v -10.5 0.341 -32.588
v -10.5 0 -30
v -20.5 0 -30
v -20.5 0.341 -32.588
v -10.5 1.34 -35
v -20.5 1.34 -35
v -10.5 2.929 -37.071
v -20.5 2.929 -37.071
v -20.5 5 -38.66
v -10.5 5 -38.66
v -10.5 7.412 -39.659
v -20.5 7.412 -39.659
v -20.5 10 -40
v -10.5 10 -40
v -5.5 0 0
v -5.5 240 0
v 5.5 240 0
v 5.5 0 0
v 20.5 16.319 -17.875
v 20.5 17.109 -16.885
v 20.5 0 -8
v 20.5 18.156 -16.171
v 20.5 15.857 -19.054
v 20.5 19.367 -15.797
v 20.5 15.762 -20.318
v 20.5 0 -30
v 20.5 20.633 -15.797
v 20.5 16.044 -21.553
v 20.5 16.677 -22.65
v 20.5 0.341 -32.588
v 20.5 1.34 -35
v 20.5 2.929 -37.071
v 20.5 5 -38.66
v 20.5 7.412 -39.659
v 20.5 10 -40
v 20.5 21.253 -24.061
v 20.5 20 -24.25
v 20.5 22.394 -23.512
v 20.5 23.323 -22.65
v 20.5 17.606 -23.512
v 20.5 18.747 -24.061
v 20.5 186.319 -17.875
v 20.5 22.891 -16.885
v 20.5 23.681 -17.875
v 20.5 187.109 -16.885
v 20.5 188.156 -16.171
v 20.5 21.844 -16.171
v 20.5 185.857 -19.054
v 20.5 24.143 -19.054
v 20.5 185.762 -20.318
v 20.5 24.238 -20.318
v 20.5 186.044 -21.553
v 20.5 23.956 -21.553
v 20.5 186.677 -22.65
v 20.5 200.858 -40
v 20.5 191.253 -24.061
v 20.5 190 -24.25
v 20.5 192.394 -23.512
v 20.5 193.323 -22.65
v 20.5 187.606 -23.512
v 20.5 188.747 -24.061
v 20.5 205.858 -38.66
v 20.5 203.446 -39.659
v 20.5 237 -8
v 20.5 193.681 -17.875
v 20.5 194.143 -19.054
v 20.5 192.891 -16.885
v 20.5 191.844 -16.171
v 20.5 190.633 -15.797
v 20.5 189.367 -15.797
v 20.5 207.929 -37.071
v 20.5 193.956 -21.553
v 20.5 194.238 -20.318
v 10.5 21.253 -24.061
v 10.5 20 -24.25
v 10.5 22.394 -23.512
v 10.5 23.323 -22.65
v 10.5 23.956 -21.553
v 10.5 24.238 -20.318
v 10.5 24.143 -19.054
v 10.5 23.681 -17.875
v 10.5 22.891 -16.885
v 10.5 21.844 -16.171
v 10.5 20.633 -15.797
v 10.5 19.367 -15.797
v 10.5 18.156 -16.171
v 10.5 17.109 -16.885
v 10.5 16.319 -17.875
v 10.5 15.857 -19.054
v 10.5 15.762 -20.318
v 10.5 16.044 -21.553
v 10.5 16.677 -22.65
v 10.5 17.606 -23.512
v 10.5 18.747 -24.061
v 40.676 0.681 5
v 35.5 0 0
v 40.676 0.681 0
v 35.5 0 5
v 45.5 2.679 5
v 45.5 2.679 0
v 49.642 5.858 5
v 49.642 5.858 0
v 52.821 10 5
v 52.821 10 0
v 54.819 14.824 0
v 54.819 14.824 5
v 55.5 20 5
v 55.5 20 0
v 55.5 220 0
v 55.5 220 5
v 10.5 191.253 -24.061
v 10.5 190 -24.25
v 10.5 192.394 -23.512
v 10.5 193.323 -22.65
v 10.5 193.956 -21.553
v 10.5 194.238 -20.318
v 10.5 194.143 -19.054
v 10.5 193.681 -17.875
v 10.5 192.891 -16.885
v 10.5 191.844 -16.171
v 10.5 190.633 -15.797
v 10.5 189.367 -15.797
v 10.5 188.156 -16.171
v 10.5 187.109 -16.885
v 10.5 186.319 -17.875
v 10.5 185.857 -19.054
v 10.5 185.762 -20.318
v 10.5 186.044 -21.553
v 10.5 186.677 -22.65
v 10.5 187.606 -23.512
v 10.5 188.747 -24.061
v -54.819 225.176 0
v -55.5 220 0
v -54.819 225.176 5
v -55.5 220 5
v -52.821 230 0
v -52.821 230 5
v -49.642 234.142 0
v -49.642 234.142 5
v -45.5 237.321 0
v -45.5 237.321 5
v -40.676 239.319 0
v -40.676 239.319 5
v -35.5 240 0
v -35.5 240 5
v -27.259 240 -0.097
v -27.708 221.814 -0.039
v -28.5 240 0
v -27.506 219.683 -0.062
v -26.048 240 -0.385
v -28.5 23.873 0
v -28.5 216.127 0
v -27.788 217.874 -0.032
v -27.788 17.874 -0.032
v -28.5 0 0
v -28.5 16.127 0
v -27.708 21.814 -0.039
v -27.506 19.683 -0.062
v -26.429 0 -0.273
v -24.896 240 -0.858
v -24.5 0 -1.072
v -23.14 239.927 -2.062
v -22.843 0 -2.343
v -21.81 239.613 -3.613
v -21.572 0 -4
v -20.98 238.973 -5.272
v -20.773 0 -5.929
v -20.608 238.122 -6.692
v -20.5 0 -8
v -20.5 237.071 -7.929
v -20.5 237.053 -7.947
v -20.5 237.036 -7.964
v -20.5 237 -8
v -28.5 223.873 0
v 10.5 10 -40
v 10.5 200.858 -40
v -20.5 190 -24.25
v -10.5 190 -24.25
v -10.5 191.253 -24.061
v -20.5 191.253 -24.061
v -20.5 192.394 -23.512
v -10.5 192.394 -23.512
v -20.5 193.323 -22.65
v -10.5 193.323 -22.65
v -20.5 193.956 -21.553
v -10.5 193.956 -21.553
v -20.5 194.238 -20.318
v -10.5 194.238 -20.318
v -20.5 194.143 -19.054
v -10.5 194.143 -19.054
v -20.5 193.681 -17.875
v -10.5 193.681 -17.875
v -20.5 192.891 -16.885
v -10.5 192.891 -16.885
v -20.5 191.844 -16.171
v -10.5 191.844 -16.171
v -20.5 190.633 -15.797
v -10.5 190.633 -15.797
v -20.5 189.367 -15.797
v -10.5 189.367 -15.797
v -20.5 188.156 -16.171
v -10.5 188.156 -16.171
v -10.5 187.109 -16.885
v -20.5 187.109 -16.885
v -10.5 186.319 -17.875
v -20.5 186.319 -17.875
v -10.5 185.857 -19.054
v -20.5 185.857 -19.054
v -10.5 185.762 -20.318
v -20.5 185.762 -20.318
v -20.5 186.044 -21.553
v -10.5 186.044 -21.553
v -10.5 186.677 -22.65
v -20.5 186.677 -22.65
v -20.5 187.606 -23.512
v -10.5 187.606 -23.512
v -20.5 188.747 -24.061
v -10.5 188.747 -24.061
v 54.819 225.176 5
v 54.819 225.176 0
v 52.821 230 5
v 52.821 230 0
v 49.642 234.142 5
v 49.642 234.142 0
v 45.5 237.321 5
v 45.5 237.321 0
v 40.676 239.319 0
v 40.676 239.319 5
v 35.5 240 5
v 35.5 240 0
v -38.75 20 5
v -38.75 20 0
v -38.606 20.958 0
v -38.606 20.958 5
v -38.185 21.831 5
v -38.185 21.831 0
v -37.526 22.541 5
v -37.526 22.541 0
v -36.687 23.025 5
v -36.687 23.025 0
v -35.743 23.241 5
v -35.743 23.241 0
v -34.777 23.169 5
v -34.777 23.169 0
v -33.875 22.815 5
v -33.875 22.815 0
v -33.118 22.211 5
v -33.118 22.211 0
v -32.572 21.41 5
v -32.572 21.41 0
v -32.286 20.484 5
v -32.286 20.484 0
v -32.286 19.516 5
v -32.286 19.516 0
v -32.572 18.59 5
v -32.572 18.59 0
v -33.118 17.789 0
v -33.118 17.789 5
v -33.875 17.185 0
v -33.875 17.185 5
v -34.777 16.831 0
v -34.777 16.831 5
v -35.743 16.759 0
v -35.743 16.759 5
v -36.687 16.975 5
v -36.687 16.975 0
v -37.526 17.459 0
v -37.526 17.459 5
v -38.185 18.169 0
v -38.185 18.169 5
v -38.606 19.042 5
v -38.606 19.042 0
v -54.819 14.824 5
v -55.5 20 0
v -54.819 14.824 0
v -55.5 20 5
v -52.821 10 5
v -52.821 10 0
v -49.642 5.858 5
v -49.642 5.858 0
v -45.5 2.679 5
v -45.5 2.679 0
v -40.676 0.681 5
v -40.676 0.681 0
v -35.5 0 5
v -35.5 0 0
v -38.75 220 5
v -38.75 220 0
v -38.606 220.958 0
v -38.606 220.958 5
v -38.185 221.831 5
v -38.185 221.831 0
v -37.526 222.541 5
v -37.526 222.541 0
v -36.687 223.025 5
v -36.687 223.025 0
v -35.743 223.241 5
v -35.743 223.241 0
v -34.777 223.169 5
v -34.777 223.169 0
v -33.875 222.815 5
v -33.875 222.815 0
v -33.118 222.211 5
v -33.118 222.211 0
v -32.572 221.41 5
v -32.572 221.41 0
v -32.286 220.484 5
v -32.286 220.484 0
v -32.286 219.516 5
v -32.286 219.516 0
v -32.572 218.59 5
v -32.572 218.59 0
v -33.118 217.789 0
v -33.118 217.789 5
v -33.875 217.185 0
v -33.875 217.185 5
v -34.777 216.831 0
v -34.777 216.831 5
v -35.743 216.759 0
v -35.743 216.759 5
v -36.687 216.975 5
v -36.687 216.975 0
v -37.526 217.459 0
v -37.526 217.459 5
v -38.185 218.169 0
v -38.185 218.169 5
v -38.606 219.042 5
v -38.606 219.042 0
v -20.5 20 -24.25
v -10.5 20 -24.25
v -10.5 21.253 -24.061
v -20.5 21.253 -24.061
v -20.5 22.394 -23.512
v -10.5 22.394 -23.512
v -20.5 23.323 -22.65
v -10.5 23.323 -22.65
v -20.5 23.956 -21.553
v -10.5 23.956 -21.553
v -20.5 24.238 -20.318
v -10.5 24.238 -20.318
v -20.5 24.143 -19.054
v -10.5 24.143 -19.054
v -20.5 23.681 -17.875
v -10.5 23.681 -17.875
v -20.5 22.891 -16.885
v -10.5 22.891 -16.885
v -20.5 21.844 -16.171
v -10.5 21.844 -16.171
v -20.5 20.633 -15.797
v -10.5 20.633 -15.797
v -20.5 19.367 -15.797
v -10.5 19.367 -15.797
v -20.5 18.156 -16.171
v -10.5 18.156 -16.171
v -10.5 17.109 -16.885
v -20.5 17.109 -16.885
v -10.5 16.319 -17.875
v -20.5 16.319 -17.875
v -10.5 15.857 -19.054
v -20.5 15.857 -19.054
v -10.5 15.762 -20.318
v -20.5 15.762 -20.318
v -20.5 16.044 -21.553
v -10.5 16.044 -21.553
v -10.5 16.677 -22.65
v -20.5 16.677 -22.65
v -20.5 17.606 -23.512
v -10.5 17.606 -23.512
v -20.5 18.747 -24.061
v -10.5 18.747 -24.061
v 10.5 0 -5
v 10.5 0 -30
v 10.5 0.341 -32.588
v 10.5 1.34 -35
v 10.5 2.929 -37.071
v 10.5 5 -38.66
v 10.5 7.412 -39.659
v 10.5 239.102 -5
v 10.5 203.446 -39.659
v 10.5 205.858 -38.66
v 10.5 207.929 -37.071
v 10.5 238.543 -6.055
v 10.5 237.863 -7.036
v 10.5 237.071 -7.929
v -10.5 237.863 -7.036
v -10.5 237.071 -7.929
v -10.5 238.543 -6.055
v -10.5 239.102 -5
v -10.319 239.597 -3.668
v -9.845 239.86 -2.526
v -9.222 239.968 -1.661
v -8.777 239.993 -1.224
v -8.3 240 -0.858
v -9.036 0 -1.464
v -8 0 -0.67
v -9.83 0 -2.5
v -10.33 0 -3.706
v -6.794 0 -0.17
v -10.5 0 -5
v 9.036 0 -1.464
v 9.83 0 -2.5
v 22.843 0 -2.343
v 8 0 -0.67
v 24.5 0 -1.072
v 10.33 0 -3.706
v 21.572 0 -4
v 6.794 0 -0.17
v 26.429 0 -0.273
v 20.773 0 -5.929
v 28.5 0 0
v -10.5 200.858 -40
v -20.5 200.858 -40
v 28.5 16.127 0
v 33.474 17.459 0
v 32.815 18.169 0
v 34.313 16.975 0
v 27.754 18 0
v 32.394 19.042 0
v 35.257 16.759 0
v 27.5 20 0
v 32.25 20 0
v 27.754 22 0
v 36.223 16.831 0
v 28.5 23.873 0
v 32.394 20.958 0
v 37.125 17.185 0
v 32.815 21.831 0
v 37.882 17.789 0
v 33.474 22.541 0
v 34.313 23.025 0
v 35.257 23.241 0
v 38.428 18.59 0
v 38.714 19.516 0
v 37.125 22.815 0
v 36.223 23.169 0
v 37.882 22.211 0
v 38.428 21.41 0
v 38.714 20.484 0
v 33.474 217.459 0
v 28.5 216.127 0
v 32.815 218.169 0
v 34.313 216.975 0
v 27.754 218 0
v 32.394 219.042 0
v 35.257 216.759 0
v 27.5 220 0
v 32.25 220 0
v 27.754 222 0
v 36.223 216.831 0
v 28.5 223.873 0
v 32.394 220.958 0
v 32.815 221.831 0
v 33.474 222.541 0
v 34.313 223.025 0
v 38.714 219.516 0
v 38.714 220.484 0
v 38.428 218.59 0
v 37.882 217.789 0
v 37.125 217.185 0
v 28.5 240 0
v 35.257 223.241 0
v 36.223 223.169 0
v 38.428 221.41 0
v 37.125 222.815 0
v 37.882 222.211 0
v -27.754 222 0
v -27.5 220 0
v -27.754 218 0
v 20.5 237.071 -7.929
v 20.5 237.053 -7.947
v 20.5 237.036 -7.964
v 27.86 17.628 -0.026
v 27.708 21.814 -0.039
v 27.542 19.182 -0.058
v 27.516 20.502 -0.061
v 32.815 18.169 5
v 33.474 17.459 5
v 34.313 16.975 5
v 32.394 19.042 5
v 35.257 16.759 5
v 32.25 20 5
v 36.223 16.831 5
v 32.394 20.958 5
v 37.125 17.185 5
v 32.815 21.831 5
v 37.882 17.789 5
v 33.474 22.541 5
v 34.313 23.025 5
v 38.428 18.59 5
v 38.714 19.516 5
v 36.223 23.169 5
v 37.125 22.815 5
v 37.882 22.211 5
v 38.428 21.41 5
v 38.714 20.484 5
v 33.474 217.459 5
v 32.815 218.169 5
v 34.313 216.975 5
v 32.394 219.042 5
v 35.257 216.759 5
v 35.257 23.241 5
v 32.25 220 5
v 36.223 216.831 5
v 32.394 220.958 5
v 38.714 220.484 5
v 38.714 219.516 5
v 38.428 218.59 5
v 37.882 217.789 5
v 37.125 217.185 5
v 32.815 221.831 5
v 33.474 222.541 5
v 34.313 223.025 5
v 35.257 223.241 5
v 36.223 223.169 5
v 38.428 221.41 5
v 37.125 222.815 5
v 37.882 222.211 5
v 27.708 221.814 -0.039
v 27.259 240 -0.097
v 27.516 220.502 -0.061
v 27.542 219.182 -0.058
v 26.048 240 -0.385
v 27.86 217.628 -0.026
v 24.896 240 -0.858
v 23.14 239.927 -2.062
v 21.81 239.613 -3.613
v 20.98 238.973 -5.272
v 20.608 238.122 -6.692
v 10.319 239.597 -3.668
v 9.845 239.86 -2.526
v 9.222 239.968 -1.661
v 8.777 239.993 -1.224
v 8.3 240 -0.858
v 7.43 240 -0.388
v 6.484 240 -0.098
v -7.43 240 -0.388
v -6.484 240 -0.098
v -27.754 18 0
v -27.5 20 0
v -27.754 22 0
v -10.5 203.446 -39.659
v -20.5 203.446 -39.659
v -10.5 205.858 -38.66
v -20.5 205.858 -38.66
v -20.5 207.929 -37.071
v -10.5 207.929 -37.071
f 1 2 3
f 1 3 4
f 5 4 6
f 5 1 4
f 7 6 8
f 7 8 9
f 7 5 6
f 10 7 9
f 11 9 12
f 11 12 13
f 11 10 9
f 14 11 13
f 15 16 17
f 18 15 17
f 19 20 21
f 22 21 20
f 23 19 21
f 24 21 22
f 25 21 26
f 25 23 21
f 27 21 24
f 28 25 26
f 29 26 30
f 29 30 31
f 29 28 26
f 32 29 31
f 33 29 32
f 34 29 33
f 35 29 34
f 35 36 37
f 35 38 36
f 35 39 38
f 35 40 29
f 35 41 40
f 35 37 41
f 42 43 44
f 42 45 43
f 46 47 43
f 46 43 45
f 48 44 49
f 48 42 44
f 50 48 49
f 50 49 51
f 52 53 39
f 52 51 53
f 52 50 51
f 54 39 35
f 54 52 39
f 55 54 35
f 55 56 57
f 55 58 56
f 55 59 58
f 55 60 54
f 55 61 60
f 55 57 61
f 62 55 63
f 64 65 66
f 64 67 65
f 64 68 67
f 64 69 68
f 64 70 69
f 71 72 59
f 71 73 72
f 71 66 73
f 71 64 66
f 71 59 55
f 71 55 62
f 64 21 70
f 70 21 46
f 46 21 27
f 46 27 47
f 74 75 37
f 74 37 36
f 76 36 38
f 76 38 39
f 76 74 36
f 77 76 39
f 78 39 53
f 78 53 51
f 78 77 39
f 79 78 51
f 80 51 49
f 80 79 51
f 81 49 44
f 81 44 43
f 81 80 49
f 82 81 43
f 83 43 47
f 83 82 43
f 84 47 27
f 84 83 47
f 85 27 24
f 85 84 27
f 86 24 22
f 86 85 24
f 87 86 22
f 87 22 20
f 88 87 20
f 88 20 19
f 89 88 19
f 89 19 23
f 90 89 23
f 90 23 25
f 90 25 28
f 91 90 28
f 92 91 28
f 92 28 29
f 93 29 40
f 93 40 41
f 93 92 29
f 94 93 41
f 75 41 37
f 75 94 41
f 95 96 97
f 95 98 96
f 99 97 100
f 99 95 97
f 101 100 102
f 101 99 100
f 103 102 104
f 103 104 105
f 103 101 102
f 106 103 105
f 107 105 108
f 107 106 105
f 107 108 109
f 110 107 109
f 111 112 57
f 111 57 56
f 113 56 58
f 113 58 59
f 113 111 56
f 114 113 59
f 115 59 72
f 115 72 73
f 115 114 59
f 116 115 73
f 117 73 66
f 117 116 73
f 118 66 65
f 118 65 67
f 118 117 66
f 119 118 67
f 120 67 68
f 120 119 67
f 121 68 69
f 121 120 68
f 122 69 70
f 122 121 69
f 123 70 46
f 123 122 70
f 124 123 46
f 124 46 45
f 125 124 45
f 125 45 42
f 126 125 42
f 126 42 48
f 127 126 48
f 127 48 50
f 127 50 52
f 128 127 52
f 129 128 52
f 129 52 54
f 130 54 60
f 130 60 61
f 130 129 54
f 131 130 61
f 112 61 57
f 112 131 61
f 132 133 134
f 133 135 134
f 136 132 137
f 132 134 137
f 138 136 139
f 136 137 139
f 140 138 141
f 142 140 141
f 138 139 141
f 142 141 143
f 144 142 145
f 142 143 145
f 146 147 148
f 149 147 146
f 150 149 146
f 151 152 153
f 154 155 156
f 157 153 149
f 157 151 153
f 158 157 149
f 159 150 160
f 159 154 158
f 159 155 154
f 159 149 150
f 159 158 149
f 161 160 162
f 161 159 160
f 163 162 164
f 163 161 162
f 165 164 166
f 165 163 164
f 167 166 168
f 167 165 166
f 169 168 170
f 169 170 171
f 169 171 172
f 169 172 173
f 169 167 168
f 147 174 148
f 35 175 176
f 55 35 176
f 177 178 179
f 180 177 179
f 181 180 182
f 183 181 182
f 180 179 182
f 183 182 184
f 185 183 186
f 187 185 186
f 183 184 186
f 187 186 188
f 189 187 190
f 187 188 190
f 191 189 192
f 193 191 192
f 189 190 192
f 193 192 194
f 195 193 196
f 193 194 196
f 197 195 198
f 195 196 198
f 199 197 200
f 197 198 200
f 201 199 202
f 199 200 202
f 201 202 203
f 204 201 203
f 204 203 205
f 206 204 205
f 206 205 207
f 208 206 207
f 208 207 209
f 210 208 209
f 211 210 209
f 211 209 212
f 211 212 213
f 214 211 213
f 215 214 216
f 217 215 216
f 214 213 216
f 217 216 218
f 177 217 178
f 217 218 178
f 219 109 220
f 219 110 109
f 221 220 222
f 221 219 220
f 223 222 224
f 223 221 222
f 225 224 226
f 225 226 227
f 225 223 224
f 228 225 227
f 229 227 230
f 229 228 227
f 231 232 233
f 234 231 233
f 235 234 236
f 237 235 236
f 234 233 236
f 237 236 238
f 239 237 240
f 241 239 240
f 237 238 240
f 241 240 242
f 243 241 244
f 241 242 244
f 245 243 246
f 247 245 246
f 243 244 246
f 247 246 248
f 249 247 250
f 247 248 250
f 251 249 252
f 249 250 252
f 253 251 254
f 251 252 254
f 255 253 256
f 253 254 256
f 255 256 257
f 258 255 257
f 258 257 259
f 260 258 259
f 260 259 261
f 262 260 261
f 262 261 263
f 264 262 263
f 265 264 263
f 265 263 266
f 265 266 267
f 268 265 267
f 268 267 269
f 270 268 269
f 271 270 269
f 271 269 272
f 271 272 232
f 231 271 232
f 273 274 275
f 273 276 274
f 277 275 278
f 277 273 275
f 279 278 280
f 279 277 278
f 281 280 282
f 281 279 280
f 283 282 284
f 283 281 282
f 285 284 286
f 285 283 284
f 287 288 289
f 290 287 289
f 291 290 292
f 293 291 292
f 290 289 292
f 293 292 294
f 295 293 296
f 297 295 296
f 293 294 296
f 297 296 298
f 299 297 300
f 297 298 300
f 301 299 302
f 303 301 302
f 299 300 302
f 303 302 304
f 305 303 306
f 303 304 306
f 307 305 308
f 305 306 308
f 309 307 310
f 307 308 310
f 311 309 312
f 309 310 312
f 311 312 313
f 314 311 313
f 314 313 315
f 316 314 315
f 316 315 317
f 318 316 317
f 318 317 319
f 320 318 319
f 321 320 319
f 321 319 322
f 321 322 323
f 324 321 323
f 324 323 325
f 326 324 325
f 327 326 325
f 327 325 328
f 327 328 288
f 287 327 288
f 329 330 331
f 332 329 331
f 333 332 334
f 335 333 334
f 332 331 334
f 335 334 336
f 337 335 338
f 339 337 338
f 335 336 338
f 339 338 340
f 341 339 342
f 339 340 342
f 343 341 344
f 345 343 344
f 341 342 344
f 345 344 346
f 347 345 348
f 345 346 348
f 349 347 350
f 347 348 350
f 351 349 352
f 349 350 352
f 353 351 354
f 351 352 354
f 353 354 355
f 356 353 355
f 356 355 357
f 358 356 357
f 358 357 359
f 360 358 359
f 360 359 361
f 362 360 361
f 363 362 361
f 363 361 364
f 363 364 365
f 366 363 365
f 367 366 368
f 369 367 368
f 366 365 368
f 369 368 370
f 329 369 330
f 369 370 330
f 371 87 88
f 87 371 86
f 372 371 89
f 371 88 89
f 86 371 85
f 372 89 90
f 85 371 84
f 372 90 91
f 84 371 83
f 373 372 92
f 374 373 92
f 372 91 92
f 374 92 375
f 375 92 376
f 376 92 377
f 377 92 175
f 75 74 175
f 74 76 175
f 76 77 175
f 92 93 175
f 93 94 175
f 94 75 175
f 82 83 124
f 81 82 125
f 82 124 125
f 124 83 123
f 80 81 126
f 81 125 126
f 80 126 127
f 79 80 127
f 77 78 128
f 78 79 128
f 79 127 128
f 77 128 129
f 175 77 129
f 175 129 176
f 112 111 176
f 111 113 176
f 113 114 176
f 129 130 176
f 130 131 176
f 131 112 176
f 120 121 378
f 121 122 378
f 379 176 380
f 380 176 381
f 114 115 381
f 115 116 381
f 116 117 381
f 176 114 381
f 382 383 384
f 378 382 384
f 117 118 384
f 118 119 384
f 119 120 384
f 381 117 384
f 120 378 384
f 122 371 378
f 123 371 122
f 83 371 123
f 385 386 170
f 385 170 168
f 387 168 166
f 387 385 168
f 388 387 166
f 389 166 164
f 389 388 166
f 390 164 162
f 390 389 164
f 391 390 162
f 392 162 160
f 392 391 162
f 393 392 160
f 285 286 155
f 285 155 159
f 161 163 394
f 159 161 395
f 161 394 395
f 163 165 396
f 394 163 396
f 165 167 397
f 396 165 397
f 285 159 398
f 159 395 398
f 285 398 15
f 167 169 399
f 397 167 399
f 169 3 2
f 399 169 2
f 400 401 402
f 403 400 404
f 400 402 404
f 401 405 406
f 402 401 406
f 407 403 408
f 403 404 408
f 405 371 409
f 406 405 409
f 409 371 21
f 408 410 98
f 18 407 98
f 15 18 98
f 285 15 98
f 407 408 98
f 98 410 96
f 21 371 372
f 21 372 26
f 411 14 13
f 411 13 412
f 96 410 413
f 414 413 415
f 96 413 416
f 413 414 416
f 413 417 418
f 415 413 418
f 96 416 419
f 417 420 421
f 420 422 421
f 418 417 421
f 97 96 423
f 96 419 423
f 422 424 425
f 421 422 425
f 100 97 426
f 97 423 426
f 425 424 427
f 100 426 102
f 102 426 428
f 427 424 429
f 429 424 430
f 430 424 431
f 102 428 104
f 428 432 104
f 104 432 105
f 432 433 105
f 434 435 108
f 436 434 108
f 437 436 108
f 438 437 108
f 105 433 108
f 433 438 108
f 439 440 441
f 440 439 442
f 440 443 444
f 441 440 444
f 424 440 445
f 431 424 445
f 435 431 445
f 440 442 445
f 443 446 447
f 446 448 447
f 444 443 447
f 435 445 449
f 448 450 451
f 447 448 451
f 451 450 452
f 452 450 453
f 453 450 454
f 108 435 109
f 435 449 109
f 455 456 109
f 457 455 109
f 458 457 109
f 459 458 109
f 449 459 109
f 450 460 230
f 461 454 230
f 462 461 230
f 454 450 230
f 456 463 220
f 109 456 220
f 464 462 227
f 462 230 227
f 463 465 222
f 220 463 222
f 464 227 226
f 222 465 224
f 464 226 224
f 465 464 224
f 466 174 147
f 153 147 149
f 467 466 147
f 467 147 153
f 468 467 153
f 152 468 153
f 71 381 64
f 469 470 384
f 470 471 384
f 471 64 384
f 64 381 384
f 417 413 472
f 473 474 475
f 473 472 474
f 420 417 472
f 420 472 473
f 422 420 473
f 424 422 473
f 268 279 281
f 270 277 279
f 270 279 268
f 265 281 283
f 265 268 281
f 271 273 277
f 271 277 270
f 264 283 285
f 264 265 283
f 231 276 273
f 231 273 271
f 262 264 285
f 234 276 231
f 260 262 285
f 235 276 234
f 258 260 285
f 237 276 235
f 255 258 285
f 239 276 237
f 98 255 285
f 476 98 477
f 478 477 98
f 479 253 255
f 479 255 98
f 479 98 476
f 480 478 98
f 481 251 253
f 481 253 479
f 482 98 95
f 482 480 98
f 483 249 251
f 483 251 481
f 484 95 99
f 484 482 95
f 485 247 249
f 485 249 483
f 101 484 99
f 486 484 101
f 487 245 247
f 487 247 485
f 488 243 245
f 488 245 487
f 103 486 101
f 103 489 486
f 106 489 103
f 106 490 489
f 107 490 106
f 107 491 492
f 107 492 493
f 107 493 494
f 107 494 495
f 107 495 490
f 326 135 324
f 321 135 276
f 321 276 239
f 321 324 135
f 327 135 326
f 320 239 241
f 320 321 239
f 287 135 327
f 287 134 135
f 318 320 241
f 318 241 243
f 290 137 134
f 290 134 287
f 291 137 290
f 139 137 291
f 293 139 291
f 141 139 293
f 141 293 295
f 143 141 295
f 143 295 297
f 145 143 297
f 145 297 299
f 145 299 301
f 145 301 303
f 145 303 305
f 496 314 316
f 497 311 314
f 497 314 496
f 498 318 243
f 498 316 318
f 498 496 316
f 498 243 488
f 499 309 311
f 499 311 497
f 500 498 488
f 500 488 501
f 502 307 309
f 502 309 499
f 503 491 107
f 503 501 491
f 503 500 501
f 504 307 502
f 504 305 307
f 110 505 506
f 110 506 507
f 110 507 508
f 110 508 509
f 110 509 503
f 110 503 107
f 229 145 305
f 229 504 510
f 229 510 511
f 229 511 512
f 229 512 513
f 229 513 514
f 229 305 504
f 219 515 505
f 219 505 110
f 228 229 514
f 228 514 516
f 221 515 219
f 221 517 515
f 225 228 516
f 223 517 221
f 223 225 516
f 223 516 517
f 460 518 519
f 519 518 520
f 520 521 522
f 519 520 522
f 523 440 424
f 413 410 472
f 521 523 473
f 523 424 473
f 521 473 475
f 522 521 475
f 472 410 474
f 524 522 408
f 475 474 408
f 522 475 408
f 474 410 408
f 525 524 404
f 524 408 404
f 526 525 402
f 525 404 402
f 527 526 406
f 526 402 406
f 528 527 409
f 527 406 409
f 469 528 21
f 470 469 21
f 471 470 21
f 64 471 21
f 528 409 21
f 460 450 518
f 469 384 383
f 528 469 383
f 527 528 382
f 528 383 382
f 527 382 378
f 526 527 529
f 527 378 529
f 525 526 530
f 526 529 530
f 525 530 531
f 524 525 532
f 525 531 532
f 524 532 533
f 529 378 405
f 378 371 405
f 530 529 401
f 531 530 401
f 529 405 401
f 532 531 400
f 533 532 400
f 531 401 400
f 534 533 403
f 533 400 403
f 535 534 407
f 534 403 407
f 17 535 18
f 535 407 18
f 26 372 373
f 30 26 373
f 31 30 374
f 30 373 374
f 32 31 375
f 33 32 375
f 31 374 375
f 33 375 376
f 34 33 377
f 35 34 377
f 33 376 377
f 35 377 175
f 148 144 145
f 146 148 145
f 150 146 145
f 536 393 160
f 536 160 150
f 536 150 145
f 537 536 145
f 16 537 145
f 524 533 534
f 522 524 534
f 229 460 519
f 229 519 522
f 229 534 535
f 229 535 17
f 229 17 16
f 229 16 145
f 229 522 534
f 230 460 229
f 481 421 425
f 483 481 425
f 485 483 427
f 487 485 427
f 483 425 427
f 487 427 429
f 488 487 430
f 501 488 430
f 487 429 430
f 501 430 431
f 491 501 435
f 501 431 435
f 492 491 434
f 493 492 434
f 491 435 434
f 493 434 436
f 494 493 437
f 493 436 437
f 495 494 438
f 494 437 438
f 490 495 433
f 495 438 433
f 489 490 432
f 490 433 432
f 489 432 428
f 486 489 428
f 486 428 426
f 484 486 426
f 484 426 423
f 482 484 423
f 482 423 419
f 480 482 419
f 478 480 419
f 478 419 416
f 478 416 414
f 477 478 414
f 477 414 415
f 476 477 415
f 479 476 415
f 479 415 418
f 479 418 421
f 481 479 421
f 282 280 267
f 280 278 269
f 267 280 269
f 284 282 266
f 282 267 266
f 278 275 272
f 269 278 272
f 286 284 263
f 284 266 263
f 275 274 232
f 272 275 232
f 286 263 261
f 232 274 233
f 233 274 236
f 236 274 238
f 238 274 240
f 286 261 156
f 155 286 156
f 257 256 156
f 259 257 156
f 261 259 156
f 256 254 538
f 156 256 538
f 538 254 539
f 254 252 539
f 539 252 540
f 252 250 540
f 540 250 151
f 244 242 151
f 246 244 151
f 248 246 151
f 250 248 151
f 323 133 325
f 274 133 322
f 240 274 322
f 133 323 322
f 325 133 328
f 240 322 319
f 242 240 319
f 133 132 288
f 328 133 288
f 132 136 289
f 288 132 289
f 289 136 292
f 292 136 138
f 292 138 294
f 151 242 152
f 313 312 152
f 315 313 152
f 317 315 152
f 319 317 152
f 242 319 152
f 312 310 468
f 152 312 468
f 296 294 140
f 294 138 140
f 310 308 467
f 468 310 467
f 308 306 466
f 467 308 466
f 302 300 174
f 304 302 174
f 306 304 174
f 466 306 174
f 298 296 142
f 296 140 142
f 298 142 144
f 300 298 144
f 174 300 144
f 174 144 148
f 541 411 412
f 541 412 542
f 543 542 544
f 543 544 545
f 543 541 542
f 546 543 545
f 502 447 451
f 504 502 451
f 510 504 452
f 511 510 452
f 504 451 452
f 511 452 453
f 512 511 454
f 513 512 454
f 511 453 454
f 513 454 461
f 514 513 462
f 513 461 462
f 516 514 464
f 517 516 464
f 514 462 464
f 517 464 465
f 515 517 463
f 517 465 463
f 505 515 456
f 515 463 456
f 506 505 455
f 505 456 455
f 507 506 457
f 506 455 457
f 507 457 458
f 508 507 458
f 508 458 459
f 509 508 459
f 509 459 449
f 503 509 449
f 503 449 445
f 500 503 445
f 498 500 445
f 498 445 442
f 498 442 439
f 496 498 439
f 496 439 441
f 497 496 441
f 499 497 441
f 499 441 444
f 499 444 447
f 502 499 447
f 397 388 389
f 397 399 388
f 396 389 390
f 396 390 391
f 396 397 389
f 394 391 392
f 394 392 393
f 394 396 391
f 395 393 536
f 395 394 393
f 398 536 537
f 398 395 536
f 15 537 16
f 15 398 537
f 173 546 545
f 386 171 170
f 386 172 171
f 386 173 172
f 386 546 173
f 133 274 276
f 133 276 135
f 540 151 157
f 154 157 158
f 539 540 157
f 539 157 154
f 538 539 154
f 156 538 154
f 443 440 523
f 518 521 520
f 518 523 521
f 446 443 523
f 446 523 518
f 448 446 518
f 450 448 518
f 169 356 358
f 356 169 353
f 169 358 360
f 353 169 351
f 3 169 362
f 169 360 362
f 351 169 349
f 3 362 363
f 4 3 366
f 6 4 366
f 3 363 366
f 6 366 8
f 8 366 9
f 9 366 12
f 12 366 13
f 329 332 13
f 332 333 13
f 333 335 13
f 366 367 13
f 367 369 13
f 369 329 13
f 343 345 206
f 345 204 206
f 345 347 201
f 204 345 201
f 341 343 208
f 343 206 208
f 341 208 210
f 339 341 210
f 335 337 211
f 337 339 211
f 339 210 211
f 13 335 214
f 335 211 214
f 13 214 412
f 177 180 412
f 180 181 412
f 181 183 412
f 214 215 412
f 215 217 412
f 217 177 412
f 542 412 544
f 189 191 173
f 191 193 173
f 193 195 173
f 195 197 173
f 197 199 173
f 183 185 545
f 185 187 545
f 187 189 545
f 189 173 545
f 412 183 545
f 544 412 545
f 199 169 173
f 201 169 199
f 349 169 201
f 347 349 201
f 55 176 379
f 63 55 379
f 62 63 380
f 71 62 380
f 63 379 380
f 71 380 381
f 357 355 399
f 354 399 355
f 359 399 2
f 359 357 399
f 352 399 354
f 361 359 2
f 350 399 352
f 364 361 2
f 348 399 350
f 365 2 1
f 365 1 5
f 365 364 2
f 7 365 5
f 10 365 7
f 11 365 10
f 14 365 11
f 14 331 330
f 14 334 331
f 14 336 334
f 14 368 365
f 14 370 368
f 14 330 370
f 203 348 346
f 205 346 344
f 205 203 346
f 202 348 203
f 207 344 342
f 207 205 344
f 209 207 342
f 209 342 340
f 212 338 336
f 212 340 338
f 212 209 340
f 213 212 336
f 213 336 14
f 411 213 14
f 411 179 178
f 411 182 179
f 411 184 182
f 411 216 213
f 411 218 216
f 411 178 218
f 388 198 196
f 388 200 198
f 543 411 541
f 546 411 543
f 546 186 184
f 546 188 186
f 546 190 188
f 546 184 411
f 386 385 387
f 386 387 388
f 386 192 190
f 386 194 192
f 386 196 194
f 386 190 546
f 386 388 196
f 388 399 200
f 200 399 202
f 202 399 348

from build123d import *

# Parameters (mm, degrees)
SKETCH1_W            = 111
SKETCH1_H            = 240
BOSS_EXTRUDE1_DEPTH  = 5
FILLET1_R            = 20
SKETCH2_R            = 4.25
BOSS_EXTRUDE2_DEPTH  = 10
FILLET2_R            = 8
FILLET3_R            = 5
FILLET2_OF_MIRROR1_R = 8
FILLET3_OF_MIRROR1_R = 5
SKETCH3_R            = 3.25
CUT_EXTRUDE1_DEPTH   = 250.560113109
SKETCH4_R            = 8
CUT_EXTRUDE2_DEPTH   = 250.560113109


with BuildPart() as part:
    # Sketch1 → Boss-Extrude1 (new body)
    with BuildSketch(Plane.XY):
        with Locations((0, 120)):
            Rectangle(SKETCH1_W, SKETCH1_H)
    extrude(amount=BOSS_EXTRUDE1_DEPTH)

    # Fillet1
    fillet1_edges = [part.edges().sort_by_distance(p)[0] for p in [
        (-55.5, 240, 2.5),
        (55.5, 240, 2.5),
        (55.5, 0, 2.5),
        (-55.5, 0, 2.5),
    ]]
    fillet(fillet1_edges, radius=FILLET1_R)

    # Sketch2 → Boss-Extrude2 (add)
    with BuildSketch(Plane(origin=(10.5, 0, 0), x_dir=(0, 0, -1), z_dir=(1, 0, 0))):
        with BuildLine():
            Line((0, 0), (30, 0))
            ThreePointArc((30, 0), (37.071067812, 2.928932188), (40, 10))
            Line((40, 10), (40, 200.857864376))
            ThreePointArc((40, 200.857864376), (39.238795325, 204.6846987), (37.071067812, 207.928932188))
            Line((37.071067812, 207.928932188), (7.928932188, 237.071067812))
            ThreePointArc((7.928932188, 237.071067812), (4.6846987, 239.238795325), (0.857864376, 240))
            Line((0.857864376, 240), (0, 240))
            Line((0, 240), (0, 0))
        make_face()
        with Locations((20, 190)):
            Circle(SKETCH2_R, mode=Mode.SUBTRACT)
        with Locations((20, 20)):
            Circle(SKETCH2_R, mode=Mode.SUBTRACT)
    boss_extrude2 = extrude(amount=BOSS_EXTRUDE2_DEPTH)

    # Fillet2
    fillet2_edges = [part.edges().sort_by_distance(p)[0] for p in [
        (20.5, 120, 0),
    ]]
    fillet(fillet2_edges, radius=FILLET2_R)

    # Fillet3
    fillet3_edges = [part.edges().sort_by_distance(p)[0] for p in [
        (10.5, 120, 0),
    ]]
    fillet(fillet3_edges, radius=FILLET3_R)

    # Mirror1: Boss-Extrude2 across plane
    add(boss_extrude2.mirror(Plane(origin=(0, 0, 0), x_dir=(0, 0, 1), z_dir=(1, 0, 0))))

    # Fillet2 of Mirror1
    fillet2_of_mirror1_edges = [part.edges().sort_by_distance(p)[0] for p in [
        (-20.5, 120, 0),
    ]]
    fillet(fillet2_of_mirror1_edges, radius=FILLET2_OF_MIRROR1_R)

    # Fillet3 of Mirror1
    fillet3_of_mirror1_edges = [part.edges().sort_by_distance(p)[0] for p in [
        (-10.5, 120, 0),
    ]]
    fillet(fillet3_of_mirror1_edges, radius=FILLET3_OF_MIRROR1_R)

    # Sketch3 → Cut-Extrude1 (cut, through all)
    with BuildSketch(Plane(origin=(0, 0, 0), x_dir=(-1, 0, 0), z_dir=(0, 0, -1))):
        with Locations((-35.5, 220)):
            Circle(SKETCH3_R)
        with Locations((-35.5, 20)):
            Circle(SKETCH3_R)
        with Locations((35.5, 20)):
            Circle(SKETCH3_R)
        with Locations((35.5, 220)):
            Circle(SKETCH3_R)
    extrude(amount=-CUT_EXTRUDE1_DEPTH, mode=Mode.SUBTRACT)

    # Sketch4 → Cut-Extrude2 (cut, through all)
    with BuildSketch(Plane(origin=(0, 0, 0), x_dir=(-1, 0, 0), z_dir=(0, 0, -1))):
        with Locations((-35.5, 220)):
            Circle(SKETCH4_R)
        with Locations((35.5, 220)):
            Circle(SKETCH4_R)
        with Locations((35.5, 20)):
            Circle(SKETCH4_R)
        with Locations((-35.5, 20)):
            Circle(SKETCH4_R)
    extrude(amount=CUT_EXTRUDE2_DEPTH, mode=Mode.SUBTRACT)


solid = part.part
